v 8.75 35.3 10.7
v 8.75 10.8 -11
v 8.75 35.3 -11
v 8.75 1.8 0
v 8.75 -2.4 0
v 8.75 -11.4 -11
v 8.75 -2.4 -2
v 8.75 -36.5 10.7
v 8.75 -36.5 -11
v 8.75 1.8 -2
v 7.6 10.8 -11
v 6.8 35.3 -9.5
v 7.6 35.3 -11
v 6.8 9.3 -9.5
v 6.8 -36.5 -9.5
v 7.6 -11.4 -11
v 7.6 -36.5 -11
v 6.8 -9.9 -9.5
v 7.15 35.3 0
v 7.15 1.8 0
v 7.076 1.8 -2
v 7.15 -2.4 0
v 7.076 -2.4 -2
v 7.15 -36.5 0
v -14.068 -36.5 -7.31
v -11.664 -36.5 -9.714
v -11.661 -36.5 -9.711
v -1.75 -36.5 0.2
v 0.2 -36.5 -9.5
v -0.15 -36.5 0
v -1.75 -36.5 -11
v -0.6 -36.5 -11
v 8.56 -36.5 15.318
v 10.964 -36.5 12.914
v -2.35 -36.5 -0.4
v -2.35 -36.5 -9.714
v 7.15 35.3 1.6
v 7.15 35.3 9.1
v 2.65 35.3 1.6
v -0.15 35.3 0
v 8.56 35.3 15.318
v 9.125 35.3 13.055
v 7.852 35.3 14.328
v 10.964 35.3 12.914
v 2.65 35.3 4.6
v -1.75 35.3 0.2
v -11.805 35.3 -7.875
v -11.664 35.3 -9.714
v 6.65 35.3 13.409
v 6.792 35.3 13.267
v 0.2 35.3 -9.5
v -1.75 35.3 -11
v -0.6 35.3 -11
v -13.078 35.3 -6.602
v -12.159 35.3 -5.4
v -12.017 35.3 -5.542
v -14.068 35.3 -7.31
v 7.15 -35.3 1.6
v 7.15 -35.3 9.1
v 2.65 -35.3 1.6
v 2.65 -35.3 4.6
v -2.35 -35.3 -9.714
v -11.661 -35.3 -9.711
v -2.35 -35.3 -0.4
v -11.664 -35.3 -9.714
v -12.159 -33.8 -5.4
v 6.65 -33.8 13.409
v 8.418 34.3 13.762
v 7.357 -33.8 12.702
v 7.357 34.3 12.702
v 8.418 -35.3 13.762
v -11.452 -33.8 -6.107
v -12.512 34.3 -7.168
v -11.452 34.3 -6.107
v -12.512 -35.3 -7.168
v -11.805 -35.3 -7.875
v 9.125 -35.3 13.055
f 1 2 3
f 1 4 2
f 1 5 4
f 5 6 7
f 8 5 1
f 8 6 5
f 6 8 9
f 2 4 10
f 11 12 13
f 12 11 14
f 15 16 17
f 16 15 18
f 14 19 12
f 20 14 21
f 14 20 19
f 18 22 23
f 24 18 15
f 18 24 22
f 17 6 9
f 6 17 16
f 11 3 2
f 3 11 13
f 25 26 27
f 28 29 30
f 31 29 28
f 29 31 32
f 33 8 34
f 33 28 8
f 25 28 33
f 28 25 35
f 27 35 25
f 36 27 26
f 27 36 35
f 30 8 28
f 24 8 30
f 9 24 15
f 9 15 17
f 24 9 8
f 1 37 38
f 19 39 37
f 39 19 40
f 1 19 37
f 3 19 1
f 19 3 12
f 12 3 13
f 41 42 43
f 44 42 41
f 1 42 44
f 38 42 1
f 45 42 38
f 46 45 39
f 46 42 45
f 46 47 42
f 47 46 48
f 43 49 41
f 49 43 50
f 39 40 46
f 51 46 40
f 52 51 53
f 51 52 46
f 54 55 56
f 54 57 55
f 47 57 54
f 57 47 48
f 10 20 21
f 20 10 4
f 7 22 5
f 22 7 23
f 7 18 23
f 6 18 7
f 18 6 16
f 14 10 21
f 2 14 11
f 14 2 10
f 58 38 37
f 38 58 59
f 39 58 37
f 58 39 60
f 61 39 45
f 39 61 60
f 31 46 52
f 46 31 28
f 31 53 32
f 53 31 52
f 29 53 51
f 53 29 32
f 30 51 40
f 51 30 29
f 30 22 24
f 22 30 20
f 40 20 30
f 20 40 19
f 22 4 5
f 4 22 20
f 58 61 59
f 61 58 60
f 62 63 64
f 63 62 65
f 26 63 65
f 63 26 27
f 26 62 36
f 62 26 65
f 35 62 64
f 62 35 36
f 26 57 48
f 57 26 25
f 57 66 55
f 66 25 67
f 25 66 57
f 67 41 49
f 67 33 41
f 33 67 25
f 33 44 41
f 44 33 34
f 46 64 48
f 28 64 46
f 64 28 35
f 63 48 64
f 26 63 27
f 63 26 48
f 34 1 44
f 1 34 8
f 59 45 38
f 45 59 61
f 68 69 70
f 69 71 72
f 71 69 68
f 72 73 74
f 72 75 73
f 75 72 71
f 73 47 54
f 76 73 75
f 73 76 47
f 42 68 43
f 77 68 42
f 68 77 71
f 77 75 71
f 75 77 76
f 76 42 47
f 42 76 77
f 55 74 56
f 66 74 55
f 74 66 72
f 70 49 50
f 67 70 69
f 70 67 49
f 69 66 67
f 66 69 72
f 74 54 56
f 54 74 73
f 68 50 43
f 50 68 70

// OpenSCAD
// ============================================================
//  Skilteholder til bakker  -  parametrisk OpenSCAD-model
//  Label:    70 x 29 mm, skubbes ind fra siden (labelvindue)
//  Vinkel:   labelen haelder 45 grader mod kunden (laeses oppefra)
//  Placering: labelen sidder centreret paa bakkens forkant (halvt foran,
//             halvt over kanten) -> lav, og daekker ikke bakkens indhold
//  Montering: klemmes ned over bakkens forkant (U-klemme)
//  Printer:  Prusa MK4S - printes STAAENDE paa den lukkede ende, ingen support (brim 5 mm)
//
//  Maal i mm.  F5 = preview, F6 = render, F7 = eksporter STL.
//  KOORDINATER (som den sidder paa bakken):
//    X = dybde   (0 = kantens yderside mod kunden, + = ind i bakken)
//    Y = bredde  (0 = labelens midte)
//    Z = hoejde  (0 = oversiden af bakkens kant)
// ============================================================

/* [Bakke] */
// "A" = velourbakke, 7,0 mm kant, midter-skillevaeg 3,4 mm (billede 1-3)
// "B" = plastkurv, 2,7 mm kant (billede 4)
// "C" = velourbakke, 7,0 mm kant, rum 71,2 mm bredt (billede 5)
// "custom" = brug custom_* nedenfor
bakke = "A"; // [A, B, C, custom]

custom_rim         = 7.0;  // kantens tykkelse
custom_divider     = 0;    // skillevaeg der skal vaere udskaering over (0 = ingen)
custom_compartment = 0;    // rum-bredde holderens inderben skal passe ned i (0 = fuld bredde)

/* [Label] */
label_w     = 70;    // labelens bredde
label_h     = 29;    // labelens hoejde
label_gap   = 1.0;   // lommens dybde (label + evt. tynd plastfolie foran)
label_clear = 0.6;   // ekstra luft i bredde og hoejde
lip         = 1.5;   // hvor meget rammen overlapper labelens kant
label_angle = 45;    // grader fra VANDRET (90 = lodret, 0 = fladt)
// hvor stor del af labelen der sidder FORAN kanten:
//   0.5 = centreret paa forkanten (default, lav og fri af varerne)
//   0   = hele labelen oppe over bakken (hvis bakkerne staar helt taet)
front_frac  = 0.5;

/* [Klemme] */
fit      = 0.3;  // ekstra luft ved roden af klemmen (samlet)
grip     = 0.4;  // klem ved benenes spids (samlet) - stoerre = strammere
leg_len  = 11;   // hvor langt benene gaar ned over kanten (kanten er ~20)
div_clear  = 0.8;  // luft omkring skillevaeggen i udskaeringen (samlet)
comp_clear = 1.2;  // luft mellem inderben og rummets vaegge (samlet)

/* [Godstykkelser] */
leg_t    = 1.6;
bridge_t = 1.6;
back_t   = 1.4;  // bagpladen bag labelen
lip_t    = 1.0;  // forkanten der holder labelen
rail     = 1.2;  // massiv kant under og over labellommen
end_wall = 1.2;  // lukket ende (stop for labelen)

/* [Visning] */
print_ready = false; // true = drejet til print (staaende paa den lukkede ende)
show_tray   = false; // true = vis bakkekant + label (kun preview)
section     = false; // true = vis kun et tyndt snit paa tvaers (profilen)
preview_text = "Creoler m. zirkonia";

$fn = 32;

// ------------------------------------------------------------
//  AFLEDTE VAERDIER
// ------------------------------------------------------------
function preset(b) =
    b == "A" ? [7.0, 3.4, 0]    :
    b == "B" ? [2.7, 0,   0]    :
    b == "C" ? [7.0, 0,   71.2] :
               [custom_rim, custom_divider, custom_compartment];

P   = preset(bakke);
t   = P[0];                                   // kantens tykkelse
nw  = P[1] > 0 ? P[1] + div_clear  : 0;       // udskaering over skillevaeg
iw  = P[2] > 0 ? P[2] - comp_clear : 0;       // inderbenets bredde (0 = fuld)

pw   = label_w + label_clear;                 // lommens bredde
ph   = label_h + label_clear;                 // lommens hoejde (langs skraaningen)
Lu   = rail + ph + rail;                      // pladens laengde langs skraaningen
vmax = back_t + label_gap + lip_t;            // pladens samlede tykkelse
y0   = -pw/2 - end_wall;                      // lukket ende
y1   =  pw/2;                                 // aaben ende (labelen skubbes ind her)
yc   = -pw/2 + label_w/2;                     // labelens midte naar den ligger mod stoppet

a   = label_angle;
xo  = -fit/2 - leg_t;                         // forside (yderbenets yderside)
xi0 = -fit/2;                                 // yderbenets inderside ved roden
xr0 = t + fit/2;                              // inderbenets inderside ved roden
xr1 = xr0 + leg_t;                            // inderbenets bagside
s_  = [cos(a), sin(a)];                       // op ad skraaningen
n_  = [-sin(a), cos(a)];                      // ud mod kunden
B   = [xo + back_t, bridge_t];                // anker: pladens bagside skaerer klemmens top-forhjoerne
P0  = B - front_frac*Lu*s_;                   // pladens nederste bag-hjoerne
u_strut = front_frac*Lu + (xr1 - B[0])/cos(a);  // hvor stiveren rammer pladen
d1  = 2;      // lige stykke ved roden af udskaeringer, derefter 45 grader (printbart)
fl_h = 1.5;   // indfoerings-fas paa benenes spids
fl_w = 0.8;

function zback(x) = B[1] + (x - B[0]) * tan(a);   // pladens bagside

top_z   = P0[1] + Lu*sin(a) + vmax*cos(a);
front_x = P0[0] - vmax*sin(a);                     // forreste punkt
echo(str(">> Bakke ", bakke, ":  kant ", t, " mm",
         nw > 0 ? str(", udskaering ", nw, " mm over skillevaeg") : "",
         iw > 0 ? str(", inderben ", iw, " mm (passer i rum)") : ""));
echo(str(">> Holder  B x D x H ca. = ", y1 - y0, " x ",
         P0[0] + Lu*cos(a) - min(front_x, xo), " x ", top_z - min(P0[1], -leg_len), " mm"));
echo(str(">> Rager ", top_z, " mm op over kanten, ", -front_x, " mm frem foran kanten, ",
         max(0, P0[0] + Lu*cos(a) - xr1), " mm ind over bakken bag inderbenet"));
echo(str(">> Laveste punkt ", -min(P0[1], -leg_len), " mm under kantens top (kanten er ~20 mm)"));
echo(str(">> Synligt vindue ", pw - lip, " x ", ph - 2*lip, " mm"));
if (u_strut > Lu - 0.5) echo(">> ADVARSEL: pladen naar ikke ind over inderbenet - ingen stiver");

// ------------------------------------------------------------
//  HJAELPERE
// ------------------------------------------------------------
// 2D-profil i (X, Z) -> ekstruderet langs Y fra ya til yb
module ext_y(ya, yb) {
    translate([0, yb, 0]) rotate([90, 0, 0]) linear_extrude(height = yb - ya) children();
}
// 2D-form i (Y, Z) -> ekstruderet langs X fra xa til xb
module ext_x(xa, xb) {
    translate([xa, 0, 0]) rotate([90, 0, 90]) linear_extrude(height = xb - xa) children();
}
// lokal (u = op ad skraaningen, v = ud mod kunden) -> profil (X, Z)
module on_plate() { translate(P0) rotate(a) children(); }

// ------------------------------------------------------------
//  2D-PROFILER (X, Z)
// ------------------------------------------------------------
module outer_leg2d() {
    polygon([[xo, 0.01], [xi0, 0.01],
             [grip/2, -(leg_len - fl_h)], [grip/2 - fl_w, -leg_len], [xo, -leg_len]]);
}
module inner_leg2d() {
    polygon([[xr0, 0.01], [xr1, 0.01], [xr1, -leg_len],
             [t - grip/2 + fl_w, -leg_len], [t - grip/2, -(leg_len - fl_h)]]);
}
module clip2d() {
    outer_leg2d();
    translate([xo, 0]) square([xr1 - xo, bridge_t]);                      // bro over kanten
    // fylder hakket under pladen ved forhjoernet (kun relevant ved front_frac ~ 0)
    polygon([[xo, bridge_t - 0.01], [B[0] + 0.01, bridge_t - 0.01], [xo, bridge_t + back_t/tan(a)]]);
    // kile mellem bro og plade lige bag ankeret (stivere samling)
    g = (xr0 - B[0] < 4) ? xr0 - B[0] + 0.01 : 3;   // smal kant: fyld helt ud til stiveren (ingen tynd sprække)
    polygon([[B[0] - 0.01, bridge_t - 0.01], [B[0] + g, bridge_t - 0.01], [B[0] + g, zback(B[0] + g) + 0.3]]);
    if (u_strut <= Lu - 0.5)                                            // stiver op til pladen
        polygon([[xr0, bridge_t - 0.01], [xr1, bridge_t - 0.01],
                 [xr1, zback(xr1) + 0.5], [xr0, zback(xr0) + 0.5]]);
}
// Lukket endeplade (kun i stop-enden): fylder rummet under pladen UDEN for bakken
// og OVER kanten -> stivere plade og mere flade paa printpladen.
// Holder 0,6 mm fri af yderbenet, saa benet stadig kan fjedre.
module end_panel2d() {
    xp = xo - 0.6;
    if (P0[0] < xp - 0.5)    // foran yderbenet
        polygon([[xp, zback(xp) + 0.01], [xp, P0[1]], P0]);
    if (u_strut <= Lu - 0.5) // over broen, op til stiveren
        polygon([[B[0], bridge_t - 0.01], [xr0 + 0.01, bridge_t - 0.01], [xr0 + 0.01, zback(xr0) + 0.3]]);
}
module plate2d()  { on_plate() square([Lu, vmax]); }
module pocket2d() { on_plate() translate([rail, back_t]) square([ph, label_gap]); }
module window2d() { on_plate() translate([rail + lip, back_t + label_gap - 0.01])
                                   square([ph - 2*lip, lip_t + 1]); }

// ------------------------------------------------------------
//  3D-DELE
// ------------------------------------------------------------
module inner_leg() {
    span = leg_len + 1 - d1;
    difference() {
        intersection() {
            ext_y(y0, y1) inner_leg2d();
            if (iw > 0)   // smallere inderben der passer ned i et rum
                ext_x(xr0 - 1, xr1 + 1)
                    polygon([[yc - iw/2, 1], [yc + iw/2, 1], [yc + iw/2, -d1],
                             [yc + iw/2 - span, -leg_len - 1], [yc - iw/2 + span, -leg_len - 1],
                             [yc - iw/2, -d1]]);
        }
        if (nw > 0)       // udskaering over skillevaeg (45 grader nedad = printbar uden support)
            ext_x(t - 0.5, xr1 + 1)
                polygon([[yc - nw/2, 0.3], [yc + nw/2, 0.3], [yc + nw/2, -d1],
                         [yc + nw/2 + span, -leg_len - 1], [yc - nw/2 - span, -leg_len - 1],
                         [yc - nw/2, -d1]]);
    }
}

module skilteholder() {
    difference() {
        union() {
            ext_y(y0, y1) clip2d();
            ext_y(y0, y0 + end_wall) end_panel2d();
            inner_leg();
            ext_y(y0, y1) plate2d();
        }
        ext_y(-pw/2, y1 + 1) pocket2d();          // lomme (lukket i hoejre ende = stop)
        ext_y(-pw/2 + lip, y1 + 1) window2d();    // vindue
        // indfoerings-fas ved den aabne ende
        hull() {
            ext_y(y1 - 1.0, y1 - 0.99) pocket2d();
            ext_y(y1, y1 + 0.01)
                on_plate() translate([rail, back_t]) square([ph, label_gap + 0.8]);
        }
    }
}

// ------------------------------------------------------------
//  PREVIEW: bakkekant, skillevaegge og label
// ------------------------------------------------------------
module tray_ghost() {
    color([0.93, 0.93, 0.91]) translate([-45, -80, -23]) cube([95, 160, 1]);  // bord
    color([0.12, 0.12, 0.14]) {
        translate([0, -70, -20]) cube([t, 140, 20]);                    // forkant
        translate([0, -70, -22]) cube([45, 140, 2]);                    // bund
        if (nw > 0)
            translate([t, yc - P[1]/2, -20]) cube([40, P[1], 20]);      // midter-skillevaeg
        if (iw > 0)
            for (s = [-1, 1])
                translate([t, yc + s*(P[2]/2 + 1.5) - 1.5, -20]) cube([40, 3, 20]);
    }
    color("white")
        translate([0, yc, 0]) rotate([90, 0, 0]) translate([0, 0, -label_w/2])
            linear_extrude(label_w) on_plate()
                translate([rail + label_clear/2, back_t + 0.2]) square([label_h, 0.2]);
    // tekst paa labelen: tekst-x = mod kundens hoejre (-Y), tekst-y = op ad skraaningen
    uc = rail + label_clear/2 + label_h/2;
    vf = back_t + 0.4;
    color([0.1, 0.1, 0.1])
        multmatrix([[0, cos(a), -sin(a), P0[0] + uc*cos(a) - vf*sin(a)],
                    [-1, 0,     0,       yc],
                    [0, sin(a),  cos(a), P0[1] + uc*sin(a) + vf*cos(a)],
                    [0, 0, 0, 1]])
            linear_extrude(0.1)
                text(preview_text, size = 4.4, halign = "center", valign = "center",
                     font = "DejaVu Sans:style=Bold");
}

// ------------------------------------------------------------
if (print_ready) {
    // staaende paa den lukkede ende -> hele profilen ligger i print-planet
    color([0.85, 0.55, 0.15]) translate([0, 0, -y0]) rotate([90, 0, 0]) skilteholder();
    if (show_tray) color([0.3, 0.3, 0.32]) translate([-35, -40, -1]) cube([80, 70, 1]);  // printplade
} else if (section) {
    // tyndt snit midt mellem udskaering og ende -> viser profilen
    color([0.85, 0.55, 0.15]) intersection() { skilteholder(); translate([-60, 15, -40]) cube([120, 2, 80]); }
    if (show_tray)
        color([0.25, 0.25, 0.28]) intersection() { tray_ghost(); translate([-60, 15.5, -40]) cube([120, 2, 80]); }
} else {
    color([0.85, 0.55, 0.15]) skilteholder();
    if (show_tray) tray_ghost();
}
